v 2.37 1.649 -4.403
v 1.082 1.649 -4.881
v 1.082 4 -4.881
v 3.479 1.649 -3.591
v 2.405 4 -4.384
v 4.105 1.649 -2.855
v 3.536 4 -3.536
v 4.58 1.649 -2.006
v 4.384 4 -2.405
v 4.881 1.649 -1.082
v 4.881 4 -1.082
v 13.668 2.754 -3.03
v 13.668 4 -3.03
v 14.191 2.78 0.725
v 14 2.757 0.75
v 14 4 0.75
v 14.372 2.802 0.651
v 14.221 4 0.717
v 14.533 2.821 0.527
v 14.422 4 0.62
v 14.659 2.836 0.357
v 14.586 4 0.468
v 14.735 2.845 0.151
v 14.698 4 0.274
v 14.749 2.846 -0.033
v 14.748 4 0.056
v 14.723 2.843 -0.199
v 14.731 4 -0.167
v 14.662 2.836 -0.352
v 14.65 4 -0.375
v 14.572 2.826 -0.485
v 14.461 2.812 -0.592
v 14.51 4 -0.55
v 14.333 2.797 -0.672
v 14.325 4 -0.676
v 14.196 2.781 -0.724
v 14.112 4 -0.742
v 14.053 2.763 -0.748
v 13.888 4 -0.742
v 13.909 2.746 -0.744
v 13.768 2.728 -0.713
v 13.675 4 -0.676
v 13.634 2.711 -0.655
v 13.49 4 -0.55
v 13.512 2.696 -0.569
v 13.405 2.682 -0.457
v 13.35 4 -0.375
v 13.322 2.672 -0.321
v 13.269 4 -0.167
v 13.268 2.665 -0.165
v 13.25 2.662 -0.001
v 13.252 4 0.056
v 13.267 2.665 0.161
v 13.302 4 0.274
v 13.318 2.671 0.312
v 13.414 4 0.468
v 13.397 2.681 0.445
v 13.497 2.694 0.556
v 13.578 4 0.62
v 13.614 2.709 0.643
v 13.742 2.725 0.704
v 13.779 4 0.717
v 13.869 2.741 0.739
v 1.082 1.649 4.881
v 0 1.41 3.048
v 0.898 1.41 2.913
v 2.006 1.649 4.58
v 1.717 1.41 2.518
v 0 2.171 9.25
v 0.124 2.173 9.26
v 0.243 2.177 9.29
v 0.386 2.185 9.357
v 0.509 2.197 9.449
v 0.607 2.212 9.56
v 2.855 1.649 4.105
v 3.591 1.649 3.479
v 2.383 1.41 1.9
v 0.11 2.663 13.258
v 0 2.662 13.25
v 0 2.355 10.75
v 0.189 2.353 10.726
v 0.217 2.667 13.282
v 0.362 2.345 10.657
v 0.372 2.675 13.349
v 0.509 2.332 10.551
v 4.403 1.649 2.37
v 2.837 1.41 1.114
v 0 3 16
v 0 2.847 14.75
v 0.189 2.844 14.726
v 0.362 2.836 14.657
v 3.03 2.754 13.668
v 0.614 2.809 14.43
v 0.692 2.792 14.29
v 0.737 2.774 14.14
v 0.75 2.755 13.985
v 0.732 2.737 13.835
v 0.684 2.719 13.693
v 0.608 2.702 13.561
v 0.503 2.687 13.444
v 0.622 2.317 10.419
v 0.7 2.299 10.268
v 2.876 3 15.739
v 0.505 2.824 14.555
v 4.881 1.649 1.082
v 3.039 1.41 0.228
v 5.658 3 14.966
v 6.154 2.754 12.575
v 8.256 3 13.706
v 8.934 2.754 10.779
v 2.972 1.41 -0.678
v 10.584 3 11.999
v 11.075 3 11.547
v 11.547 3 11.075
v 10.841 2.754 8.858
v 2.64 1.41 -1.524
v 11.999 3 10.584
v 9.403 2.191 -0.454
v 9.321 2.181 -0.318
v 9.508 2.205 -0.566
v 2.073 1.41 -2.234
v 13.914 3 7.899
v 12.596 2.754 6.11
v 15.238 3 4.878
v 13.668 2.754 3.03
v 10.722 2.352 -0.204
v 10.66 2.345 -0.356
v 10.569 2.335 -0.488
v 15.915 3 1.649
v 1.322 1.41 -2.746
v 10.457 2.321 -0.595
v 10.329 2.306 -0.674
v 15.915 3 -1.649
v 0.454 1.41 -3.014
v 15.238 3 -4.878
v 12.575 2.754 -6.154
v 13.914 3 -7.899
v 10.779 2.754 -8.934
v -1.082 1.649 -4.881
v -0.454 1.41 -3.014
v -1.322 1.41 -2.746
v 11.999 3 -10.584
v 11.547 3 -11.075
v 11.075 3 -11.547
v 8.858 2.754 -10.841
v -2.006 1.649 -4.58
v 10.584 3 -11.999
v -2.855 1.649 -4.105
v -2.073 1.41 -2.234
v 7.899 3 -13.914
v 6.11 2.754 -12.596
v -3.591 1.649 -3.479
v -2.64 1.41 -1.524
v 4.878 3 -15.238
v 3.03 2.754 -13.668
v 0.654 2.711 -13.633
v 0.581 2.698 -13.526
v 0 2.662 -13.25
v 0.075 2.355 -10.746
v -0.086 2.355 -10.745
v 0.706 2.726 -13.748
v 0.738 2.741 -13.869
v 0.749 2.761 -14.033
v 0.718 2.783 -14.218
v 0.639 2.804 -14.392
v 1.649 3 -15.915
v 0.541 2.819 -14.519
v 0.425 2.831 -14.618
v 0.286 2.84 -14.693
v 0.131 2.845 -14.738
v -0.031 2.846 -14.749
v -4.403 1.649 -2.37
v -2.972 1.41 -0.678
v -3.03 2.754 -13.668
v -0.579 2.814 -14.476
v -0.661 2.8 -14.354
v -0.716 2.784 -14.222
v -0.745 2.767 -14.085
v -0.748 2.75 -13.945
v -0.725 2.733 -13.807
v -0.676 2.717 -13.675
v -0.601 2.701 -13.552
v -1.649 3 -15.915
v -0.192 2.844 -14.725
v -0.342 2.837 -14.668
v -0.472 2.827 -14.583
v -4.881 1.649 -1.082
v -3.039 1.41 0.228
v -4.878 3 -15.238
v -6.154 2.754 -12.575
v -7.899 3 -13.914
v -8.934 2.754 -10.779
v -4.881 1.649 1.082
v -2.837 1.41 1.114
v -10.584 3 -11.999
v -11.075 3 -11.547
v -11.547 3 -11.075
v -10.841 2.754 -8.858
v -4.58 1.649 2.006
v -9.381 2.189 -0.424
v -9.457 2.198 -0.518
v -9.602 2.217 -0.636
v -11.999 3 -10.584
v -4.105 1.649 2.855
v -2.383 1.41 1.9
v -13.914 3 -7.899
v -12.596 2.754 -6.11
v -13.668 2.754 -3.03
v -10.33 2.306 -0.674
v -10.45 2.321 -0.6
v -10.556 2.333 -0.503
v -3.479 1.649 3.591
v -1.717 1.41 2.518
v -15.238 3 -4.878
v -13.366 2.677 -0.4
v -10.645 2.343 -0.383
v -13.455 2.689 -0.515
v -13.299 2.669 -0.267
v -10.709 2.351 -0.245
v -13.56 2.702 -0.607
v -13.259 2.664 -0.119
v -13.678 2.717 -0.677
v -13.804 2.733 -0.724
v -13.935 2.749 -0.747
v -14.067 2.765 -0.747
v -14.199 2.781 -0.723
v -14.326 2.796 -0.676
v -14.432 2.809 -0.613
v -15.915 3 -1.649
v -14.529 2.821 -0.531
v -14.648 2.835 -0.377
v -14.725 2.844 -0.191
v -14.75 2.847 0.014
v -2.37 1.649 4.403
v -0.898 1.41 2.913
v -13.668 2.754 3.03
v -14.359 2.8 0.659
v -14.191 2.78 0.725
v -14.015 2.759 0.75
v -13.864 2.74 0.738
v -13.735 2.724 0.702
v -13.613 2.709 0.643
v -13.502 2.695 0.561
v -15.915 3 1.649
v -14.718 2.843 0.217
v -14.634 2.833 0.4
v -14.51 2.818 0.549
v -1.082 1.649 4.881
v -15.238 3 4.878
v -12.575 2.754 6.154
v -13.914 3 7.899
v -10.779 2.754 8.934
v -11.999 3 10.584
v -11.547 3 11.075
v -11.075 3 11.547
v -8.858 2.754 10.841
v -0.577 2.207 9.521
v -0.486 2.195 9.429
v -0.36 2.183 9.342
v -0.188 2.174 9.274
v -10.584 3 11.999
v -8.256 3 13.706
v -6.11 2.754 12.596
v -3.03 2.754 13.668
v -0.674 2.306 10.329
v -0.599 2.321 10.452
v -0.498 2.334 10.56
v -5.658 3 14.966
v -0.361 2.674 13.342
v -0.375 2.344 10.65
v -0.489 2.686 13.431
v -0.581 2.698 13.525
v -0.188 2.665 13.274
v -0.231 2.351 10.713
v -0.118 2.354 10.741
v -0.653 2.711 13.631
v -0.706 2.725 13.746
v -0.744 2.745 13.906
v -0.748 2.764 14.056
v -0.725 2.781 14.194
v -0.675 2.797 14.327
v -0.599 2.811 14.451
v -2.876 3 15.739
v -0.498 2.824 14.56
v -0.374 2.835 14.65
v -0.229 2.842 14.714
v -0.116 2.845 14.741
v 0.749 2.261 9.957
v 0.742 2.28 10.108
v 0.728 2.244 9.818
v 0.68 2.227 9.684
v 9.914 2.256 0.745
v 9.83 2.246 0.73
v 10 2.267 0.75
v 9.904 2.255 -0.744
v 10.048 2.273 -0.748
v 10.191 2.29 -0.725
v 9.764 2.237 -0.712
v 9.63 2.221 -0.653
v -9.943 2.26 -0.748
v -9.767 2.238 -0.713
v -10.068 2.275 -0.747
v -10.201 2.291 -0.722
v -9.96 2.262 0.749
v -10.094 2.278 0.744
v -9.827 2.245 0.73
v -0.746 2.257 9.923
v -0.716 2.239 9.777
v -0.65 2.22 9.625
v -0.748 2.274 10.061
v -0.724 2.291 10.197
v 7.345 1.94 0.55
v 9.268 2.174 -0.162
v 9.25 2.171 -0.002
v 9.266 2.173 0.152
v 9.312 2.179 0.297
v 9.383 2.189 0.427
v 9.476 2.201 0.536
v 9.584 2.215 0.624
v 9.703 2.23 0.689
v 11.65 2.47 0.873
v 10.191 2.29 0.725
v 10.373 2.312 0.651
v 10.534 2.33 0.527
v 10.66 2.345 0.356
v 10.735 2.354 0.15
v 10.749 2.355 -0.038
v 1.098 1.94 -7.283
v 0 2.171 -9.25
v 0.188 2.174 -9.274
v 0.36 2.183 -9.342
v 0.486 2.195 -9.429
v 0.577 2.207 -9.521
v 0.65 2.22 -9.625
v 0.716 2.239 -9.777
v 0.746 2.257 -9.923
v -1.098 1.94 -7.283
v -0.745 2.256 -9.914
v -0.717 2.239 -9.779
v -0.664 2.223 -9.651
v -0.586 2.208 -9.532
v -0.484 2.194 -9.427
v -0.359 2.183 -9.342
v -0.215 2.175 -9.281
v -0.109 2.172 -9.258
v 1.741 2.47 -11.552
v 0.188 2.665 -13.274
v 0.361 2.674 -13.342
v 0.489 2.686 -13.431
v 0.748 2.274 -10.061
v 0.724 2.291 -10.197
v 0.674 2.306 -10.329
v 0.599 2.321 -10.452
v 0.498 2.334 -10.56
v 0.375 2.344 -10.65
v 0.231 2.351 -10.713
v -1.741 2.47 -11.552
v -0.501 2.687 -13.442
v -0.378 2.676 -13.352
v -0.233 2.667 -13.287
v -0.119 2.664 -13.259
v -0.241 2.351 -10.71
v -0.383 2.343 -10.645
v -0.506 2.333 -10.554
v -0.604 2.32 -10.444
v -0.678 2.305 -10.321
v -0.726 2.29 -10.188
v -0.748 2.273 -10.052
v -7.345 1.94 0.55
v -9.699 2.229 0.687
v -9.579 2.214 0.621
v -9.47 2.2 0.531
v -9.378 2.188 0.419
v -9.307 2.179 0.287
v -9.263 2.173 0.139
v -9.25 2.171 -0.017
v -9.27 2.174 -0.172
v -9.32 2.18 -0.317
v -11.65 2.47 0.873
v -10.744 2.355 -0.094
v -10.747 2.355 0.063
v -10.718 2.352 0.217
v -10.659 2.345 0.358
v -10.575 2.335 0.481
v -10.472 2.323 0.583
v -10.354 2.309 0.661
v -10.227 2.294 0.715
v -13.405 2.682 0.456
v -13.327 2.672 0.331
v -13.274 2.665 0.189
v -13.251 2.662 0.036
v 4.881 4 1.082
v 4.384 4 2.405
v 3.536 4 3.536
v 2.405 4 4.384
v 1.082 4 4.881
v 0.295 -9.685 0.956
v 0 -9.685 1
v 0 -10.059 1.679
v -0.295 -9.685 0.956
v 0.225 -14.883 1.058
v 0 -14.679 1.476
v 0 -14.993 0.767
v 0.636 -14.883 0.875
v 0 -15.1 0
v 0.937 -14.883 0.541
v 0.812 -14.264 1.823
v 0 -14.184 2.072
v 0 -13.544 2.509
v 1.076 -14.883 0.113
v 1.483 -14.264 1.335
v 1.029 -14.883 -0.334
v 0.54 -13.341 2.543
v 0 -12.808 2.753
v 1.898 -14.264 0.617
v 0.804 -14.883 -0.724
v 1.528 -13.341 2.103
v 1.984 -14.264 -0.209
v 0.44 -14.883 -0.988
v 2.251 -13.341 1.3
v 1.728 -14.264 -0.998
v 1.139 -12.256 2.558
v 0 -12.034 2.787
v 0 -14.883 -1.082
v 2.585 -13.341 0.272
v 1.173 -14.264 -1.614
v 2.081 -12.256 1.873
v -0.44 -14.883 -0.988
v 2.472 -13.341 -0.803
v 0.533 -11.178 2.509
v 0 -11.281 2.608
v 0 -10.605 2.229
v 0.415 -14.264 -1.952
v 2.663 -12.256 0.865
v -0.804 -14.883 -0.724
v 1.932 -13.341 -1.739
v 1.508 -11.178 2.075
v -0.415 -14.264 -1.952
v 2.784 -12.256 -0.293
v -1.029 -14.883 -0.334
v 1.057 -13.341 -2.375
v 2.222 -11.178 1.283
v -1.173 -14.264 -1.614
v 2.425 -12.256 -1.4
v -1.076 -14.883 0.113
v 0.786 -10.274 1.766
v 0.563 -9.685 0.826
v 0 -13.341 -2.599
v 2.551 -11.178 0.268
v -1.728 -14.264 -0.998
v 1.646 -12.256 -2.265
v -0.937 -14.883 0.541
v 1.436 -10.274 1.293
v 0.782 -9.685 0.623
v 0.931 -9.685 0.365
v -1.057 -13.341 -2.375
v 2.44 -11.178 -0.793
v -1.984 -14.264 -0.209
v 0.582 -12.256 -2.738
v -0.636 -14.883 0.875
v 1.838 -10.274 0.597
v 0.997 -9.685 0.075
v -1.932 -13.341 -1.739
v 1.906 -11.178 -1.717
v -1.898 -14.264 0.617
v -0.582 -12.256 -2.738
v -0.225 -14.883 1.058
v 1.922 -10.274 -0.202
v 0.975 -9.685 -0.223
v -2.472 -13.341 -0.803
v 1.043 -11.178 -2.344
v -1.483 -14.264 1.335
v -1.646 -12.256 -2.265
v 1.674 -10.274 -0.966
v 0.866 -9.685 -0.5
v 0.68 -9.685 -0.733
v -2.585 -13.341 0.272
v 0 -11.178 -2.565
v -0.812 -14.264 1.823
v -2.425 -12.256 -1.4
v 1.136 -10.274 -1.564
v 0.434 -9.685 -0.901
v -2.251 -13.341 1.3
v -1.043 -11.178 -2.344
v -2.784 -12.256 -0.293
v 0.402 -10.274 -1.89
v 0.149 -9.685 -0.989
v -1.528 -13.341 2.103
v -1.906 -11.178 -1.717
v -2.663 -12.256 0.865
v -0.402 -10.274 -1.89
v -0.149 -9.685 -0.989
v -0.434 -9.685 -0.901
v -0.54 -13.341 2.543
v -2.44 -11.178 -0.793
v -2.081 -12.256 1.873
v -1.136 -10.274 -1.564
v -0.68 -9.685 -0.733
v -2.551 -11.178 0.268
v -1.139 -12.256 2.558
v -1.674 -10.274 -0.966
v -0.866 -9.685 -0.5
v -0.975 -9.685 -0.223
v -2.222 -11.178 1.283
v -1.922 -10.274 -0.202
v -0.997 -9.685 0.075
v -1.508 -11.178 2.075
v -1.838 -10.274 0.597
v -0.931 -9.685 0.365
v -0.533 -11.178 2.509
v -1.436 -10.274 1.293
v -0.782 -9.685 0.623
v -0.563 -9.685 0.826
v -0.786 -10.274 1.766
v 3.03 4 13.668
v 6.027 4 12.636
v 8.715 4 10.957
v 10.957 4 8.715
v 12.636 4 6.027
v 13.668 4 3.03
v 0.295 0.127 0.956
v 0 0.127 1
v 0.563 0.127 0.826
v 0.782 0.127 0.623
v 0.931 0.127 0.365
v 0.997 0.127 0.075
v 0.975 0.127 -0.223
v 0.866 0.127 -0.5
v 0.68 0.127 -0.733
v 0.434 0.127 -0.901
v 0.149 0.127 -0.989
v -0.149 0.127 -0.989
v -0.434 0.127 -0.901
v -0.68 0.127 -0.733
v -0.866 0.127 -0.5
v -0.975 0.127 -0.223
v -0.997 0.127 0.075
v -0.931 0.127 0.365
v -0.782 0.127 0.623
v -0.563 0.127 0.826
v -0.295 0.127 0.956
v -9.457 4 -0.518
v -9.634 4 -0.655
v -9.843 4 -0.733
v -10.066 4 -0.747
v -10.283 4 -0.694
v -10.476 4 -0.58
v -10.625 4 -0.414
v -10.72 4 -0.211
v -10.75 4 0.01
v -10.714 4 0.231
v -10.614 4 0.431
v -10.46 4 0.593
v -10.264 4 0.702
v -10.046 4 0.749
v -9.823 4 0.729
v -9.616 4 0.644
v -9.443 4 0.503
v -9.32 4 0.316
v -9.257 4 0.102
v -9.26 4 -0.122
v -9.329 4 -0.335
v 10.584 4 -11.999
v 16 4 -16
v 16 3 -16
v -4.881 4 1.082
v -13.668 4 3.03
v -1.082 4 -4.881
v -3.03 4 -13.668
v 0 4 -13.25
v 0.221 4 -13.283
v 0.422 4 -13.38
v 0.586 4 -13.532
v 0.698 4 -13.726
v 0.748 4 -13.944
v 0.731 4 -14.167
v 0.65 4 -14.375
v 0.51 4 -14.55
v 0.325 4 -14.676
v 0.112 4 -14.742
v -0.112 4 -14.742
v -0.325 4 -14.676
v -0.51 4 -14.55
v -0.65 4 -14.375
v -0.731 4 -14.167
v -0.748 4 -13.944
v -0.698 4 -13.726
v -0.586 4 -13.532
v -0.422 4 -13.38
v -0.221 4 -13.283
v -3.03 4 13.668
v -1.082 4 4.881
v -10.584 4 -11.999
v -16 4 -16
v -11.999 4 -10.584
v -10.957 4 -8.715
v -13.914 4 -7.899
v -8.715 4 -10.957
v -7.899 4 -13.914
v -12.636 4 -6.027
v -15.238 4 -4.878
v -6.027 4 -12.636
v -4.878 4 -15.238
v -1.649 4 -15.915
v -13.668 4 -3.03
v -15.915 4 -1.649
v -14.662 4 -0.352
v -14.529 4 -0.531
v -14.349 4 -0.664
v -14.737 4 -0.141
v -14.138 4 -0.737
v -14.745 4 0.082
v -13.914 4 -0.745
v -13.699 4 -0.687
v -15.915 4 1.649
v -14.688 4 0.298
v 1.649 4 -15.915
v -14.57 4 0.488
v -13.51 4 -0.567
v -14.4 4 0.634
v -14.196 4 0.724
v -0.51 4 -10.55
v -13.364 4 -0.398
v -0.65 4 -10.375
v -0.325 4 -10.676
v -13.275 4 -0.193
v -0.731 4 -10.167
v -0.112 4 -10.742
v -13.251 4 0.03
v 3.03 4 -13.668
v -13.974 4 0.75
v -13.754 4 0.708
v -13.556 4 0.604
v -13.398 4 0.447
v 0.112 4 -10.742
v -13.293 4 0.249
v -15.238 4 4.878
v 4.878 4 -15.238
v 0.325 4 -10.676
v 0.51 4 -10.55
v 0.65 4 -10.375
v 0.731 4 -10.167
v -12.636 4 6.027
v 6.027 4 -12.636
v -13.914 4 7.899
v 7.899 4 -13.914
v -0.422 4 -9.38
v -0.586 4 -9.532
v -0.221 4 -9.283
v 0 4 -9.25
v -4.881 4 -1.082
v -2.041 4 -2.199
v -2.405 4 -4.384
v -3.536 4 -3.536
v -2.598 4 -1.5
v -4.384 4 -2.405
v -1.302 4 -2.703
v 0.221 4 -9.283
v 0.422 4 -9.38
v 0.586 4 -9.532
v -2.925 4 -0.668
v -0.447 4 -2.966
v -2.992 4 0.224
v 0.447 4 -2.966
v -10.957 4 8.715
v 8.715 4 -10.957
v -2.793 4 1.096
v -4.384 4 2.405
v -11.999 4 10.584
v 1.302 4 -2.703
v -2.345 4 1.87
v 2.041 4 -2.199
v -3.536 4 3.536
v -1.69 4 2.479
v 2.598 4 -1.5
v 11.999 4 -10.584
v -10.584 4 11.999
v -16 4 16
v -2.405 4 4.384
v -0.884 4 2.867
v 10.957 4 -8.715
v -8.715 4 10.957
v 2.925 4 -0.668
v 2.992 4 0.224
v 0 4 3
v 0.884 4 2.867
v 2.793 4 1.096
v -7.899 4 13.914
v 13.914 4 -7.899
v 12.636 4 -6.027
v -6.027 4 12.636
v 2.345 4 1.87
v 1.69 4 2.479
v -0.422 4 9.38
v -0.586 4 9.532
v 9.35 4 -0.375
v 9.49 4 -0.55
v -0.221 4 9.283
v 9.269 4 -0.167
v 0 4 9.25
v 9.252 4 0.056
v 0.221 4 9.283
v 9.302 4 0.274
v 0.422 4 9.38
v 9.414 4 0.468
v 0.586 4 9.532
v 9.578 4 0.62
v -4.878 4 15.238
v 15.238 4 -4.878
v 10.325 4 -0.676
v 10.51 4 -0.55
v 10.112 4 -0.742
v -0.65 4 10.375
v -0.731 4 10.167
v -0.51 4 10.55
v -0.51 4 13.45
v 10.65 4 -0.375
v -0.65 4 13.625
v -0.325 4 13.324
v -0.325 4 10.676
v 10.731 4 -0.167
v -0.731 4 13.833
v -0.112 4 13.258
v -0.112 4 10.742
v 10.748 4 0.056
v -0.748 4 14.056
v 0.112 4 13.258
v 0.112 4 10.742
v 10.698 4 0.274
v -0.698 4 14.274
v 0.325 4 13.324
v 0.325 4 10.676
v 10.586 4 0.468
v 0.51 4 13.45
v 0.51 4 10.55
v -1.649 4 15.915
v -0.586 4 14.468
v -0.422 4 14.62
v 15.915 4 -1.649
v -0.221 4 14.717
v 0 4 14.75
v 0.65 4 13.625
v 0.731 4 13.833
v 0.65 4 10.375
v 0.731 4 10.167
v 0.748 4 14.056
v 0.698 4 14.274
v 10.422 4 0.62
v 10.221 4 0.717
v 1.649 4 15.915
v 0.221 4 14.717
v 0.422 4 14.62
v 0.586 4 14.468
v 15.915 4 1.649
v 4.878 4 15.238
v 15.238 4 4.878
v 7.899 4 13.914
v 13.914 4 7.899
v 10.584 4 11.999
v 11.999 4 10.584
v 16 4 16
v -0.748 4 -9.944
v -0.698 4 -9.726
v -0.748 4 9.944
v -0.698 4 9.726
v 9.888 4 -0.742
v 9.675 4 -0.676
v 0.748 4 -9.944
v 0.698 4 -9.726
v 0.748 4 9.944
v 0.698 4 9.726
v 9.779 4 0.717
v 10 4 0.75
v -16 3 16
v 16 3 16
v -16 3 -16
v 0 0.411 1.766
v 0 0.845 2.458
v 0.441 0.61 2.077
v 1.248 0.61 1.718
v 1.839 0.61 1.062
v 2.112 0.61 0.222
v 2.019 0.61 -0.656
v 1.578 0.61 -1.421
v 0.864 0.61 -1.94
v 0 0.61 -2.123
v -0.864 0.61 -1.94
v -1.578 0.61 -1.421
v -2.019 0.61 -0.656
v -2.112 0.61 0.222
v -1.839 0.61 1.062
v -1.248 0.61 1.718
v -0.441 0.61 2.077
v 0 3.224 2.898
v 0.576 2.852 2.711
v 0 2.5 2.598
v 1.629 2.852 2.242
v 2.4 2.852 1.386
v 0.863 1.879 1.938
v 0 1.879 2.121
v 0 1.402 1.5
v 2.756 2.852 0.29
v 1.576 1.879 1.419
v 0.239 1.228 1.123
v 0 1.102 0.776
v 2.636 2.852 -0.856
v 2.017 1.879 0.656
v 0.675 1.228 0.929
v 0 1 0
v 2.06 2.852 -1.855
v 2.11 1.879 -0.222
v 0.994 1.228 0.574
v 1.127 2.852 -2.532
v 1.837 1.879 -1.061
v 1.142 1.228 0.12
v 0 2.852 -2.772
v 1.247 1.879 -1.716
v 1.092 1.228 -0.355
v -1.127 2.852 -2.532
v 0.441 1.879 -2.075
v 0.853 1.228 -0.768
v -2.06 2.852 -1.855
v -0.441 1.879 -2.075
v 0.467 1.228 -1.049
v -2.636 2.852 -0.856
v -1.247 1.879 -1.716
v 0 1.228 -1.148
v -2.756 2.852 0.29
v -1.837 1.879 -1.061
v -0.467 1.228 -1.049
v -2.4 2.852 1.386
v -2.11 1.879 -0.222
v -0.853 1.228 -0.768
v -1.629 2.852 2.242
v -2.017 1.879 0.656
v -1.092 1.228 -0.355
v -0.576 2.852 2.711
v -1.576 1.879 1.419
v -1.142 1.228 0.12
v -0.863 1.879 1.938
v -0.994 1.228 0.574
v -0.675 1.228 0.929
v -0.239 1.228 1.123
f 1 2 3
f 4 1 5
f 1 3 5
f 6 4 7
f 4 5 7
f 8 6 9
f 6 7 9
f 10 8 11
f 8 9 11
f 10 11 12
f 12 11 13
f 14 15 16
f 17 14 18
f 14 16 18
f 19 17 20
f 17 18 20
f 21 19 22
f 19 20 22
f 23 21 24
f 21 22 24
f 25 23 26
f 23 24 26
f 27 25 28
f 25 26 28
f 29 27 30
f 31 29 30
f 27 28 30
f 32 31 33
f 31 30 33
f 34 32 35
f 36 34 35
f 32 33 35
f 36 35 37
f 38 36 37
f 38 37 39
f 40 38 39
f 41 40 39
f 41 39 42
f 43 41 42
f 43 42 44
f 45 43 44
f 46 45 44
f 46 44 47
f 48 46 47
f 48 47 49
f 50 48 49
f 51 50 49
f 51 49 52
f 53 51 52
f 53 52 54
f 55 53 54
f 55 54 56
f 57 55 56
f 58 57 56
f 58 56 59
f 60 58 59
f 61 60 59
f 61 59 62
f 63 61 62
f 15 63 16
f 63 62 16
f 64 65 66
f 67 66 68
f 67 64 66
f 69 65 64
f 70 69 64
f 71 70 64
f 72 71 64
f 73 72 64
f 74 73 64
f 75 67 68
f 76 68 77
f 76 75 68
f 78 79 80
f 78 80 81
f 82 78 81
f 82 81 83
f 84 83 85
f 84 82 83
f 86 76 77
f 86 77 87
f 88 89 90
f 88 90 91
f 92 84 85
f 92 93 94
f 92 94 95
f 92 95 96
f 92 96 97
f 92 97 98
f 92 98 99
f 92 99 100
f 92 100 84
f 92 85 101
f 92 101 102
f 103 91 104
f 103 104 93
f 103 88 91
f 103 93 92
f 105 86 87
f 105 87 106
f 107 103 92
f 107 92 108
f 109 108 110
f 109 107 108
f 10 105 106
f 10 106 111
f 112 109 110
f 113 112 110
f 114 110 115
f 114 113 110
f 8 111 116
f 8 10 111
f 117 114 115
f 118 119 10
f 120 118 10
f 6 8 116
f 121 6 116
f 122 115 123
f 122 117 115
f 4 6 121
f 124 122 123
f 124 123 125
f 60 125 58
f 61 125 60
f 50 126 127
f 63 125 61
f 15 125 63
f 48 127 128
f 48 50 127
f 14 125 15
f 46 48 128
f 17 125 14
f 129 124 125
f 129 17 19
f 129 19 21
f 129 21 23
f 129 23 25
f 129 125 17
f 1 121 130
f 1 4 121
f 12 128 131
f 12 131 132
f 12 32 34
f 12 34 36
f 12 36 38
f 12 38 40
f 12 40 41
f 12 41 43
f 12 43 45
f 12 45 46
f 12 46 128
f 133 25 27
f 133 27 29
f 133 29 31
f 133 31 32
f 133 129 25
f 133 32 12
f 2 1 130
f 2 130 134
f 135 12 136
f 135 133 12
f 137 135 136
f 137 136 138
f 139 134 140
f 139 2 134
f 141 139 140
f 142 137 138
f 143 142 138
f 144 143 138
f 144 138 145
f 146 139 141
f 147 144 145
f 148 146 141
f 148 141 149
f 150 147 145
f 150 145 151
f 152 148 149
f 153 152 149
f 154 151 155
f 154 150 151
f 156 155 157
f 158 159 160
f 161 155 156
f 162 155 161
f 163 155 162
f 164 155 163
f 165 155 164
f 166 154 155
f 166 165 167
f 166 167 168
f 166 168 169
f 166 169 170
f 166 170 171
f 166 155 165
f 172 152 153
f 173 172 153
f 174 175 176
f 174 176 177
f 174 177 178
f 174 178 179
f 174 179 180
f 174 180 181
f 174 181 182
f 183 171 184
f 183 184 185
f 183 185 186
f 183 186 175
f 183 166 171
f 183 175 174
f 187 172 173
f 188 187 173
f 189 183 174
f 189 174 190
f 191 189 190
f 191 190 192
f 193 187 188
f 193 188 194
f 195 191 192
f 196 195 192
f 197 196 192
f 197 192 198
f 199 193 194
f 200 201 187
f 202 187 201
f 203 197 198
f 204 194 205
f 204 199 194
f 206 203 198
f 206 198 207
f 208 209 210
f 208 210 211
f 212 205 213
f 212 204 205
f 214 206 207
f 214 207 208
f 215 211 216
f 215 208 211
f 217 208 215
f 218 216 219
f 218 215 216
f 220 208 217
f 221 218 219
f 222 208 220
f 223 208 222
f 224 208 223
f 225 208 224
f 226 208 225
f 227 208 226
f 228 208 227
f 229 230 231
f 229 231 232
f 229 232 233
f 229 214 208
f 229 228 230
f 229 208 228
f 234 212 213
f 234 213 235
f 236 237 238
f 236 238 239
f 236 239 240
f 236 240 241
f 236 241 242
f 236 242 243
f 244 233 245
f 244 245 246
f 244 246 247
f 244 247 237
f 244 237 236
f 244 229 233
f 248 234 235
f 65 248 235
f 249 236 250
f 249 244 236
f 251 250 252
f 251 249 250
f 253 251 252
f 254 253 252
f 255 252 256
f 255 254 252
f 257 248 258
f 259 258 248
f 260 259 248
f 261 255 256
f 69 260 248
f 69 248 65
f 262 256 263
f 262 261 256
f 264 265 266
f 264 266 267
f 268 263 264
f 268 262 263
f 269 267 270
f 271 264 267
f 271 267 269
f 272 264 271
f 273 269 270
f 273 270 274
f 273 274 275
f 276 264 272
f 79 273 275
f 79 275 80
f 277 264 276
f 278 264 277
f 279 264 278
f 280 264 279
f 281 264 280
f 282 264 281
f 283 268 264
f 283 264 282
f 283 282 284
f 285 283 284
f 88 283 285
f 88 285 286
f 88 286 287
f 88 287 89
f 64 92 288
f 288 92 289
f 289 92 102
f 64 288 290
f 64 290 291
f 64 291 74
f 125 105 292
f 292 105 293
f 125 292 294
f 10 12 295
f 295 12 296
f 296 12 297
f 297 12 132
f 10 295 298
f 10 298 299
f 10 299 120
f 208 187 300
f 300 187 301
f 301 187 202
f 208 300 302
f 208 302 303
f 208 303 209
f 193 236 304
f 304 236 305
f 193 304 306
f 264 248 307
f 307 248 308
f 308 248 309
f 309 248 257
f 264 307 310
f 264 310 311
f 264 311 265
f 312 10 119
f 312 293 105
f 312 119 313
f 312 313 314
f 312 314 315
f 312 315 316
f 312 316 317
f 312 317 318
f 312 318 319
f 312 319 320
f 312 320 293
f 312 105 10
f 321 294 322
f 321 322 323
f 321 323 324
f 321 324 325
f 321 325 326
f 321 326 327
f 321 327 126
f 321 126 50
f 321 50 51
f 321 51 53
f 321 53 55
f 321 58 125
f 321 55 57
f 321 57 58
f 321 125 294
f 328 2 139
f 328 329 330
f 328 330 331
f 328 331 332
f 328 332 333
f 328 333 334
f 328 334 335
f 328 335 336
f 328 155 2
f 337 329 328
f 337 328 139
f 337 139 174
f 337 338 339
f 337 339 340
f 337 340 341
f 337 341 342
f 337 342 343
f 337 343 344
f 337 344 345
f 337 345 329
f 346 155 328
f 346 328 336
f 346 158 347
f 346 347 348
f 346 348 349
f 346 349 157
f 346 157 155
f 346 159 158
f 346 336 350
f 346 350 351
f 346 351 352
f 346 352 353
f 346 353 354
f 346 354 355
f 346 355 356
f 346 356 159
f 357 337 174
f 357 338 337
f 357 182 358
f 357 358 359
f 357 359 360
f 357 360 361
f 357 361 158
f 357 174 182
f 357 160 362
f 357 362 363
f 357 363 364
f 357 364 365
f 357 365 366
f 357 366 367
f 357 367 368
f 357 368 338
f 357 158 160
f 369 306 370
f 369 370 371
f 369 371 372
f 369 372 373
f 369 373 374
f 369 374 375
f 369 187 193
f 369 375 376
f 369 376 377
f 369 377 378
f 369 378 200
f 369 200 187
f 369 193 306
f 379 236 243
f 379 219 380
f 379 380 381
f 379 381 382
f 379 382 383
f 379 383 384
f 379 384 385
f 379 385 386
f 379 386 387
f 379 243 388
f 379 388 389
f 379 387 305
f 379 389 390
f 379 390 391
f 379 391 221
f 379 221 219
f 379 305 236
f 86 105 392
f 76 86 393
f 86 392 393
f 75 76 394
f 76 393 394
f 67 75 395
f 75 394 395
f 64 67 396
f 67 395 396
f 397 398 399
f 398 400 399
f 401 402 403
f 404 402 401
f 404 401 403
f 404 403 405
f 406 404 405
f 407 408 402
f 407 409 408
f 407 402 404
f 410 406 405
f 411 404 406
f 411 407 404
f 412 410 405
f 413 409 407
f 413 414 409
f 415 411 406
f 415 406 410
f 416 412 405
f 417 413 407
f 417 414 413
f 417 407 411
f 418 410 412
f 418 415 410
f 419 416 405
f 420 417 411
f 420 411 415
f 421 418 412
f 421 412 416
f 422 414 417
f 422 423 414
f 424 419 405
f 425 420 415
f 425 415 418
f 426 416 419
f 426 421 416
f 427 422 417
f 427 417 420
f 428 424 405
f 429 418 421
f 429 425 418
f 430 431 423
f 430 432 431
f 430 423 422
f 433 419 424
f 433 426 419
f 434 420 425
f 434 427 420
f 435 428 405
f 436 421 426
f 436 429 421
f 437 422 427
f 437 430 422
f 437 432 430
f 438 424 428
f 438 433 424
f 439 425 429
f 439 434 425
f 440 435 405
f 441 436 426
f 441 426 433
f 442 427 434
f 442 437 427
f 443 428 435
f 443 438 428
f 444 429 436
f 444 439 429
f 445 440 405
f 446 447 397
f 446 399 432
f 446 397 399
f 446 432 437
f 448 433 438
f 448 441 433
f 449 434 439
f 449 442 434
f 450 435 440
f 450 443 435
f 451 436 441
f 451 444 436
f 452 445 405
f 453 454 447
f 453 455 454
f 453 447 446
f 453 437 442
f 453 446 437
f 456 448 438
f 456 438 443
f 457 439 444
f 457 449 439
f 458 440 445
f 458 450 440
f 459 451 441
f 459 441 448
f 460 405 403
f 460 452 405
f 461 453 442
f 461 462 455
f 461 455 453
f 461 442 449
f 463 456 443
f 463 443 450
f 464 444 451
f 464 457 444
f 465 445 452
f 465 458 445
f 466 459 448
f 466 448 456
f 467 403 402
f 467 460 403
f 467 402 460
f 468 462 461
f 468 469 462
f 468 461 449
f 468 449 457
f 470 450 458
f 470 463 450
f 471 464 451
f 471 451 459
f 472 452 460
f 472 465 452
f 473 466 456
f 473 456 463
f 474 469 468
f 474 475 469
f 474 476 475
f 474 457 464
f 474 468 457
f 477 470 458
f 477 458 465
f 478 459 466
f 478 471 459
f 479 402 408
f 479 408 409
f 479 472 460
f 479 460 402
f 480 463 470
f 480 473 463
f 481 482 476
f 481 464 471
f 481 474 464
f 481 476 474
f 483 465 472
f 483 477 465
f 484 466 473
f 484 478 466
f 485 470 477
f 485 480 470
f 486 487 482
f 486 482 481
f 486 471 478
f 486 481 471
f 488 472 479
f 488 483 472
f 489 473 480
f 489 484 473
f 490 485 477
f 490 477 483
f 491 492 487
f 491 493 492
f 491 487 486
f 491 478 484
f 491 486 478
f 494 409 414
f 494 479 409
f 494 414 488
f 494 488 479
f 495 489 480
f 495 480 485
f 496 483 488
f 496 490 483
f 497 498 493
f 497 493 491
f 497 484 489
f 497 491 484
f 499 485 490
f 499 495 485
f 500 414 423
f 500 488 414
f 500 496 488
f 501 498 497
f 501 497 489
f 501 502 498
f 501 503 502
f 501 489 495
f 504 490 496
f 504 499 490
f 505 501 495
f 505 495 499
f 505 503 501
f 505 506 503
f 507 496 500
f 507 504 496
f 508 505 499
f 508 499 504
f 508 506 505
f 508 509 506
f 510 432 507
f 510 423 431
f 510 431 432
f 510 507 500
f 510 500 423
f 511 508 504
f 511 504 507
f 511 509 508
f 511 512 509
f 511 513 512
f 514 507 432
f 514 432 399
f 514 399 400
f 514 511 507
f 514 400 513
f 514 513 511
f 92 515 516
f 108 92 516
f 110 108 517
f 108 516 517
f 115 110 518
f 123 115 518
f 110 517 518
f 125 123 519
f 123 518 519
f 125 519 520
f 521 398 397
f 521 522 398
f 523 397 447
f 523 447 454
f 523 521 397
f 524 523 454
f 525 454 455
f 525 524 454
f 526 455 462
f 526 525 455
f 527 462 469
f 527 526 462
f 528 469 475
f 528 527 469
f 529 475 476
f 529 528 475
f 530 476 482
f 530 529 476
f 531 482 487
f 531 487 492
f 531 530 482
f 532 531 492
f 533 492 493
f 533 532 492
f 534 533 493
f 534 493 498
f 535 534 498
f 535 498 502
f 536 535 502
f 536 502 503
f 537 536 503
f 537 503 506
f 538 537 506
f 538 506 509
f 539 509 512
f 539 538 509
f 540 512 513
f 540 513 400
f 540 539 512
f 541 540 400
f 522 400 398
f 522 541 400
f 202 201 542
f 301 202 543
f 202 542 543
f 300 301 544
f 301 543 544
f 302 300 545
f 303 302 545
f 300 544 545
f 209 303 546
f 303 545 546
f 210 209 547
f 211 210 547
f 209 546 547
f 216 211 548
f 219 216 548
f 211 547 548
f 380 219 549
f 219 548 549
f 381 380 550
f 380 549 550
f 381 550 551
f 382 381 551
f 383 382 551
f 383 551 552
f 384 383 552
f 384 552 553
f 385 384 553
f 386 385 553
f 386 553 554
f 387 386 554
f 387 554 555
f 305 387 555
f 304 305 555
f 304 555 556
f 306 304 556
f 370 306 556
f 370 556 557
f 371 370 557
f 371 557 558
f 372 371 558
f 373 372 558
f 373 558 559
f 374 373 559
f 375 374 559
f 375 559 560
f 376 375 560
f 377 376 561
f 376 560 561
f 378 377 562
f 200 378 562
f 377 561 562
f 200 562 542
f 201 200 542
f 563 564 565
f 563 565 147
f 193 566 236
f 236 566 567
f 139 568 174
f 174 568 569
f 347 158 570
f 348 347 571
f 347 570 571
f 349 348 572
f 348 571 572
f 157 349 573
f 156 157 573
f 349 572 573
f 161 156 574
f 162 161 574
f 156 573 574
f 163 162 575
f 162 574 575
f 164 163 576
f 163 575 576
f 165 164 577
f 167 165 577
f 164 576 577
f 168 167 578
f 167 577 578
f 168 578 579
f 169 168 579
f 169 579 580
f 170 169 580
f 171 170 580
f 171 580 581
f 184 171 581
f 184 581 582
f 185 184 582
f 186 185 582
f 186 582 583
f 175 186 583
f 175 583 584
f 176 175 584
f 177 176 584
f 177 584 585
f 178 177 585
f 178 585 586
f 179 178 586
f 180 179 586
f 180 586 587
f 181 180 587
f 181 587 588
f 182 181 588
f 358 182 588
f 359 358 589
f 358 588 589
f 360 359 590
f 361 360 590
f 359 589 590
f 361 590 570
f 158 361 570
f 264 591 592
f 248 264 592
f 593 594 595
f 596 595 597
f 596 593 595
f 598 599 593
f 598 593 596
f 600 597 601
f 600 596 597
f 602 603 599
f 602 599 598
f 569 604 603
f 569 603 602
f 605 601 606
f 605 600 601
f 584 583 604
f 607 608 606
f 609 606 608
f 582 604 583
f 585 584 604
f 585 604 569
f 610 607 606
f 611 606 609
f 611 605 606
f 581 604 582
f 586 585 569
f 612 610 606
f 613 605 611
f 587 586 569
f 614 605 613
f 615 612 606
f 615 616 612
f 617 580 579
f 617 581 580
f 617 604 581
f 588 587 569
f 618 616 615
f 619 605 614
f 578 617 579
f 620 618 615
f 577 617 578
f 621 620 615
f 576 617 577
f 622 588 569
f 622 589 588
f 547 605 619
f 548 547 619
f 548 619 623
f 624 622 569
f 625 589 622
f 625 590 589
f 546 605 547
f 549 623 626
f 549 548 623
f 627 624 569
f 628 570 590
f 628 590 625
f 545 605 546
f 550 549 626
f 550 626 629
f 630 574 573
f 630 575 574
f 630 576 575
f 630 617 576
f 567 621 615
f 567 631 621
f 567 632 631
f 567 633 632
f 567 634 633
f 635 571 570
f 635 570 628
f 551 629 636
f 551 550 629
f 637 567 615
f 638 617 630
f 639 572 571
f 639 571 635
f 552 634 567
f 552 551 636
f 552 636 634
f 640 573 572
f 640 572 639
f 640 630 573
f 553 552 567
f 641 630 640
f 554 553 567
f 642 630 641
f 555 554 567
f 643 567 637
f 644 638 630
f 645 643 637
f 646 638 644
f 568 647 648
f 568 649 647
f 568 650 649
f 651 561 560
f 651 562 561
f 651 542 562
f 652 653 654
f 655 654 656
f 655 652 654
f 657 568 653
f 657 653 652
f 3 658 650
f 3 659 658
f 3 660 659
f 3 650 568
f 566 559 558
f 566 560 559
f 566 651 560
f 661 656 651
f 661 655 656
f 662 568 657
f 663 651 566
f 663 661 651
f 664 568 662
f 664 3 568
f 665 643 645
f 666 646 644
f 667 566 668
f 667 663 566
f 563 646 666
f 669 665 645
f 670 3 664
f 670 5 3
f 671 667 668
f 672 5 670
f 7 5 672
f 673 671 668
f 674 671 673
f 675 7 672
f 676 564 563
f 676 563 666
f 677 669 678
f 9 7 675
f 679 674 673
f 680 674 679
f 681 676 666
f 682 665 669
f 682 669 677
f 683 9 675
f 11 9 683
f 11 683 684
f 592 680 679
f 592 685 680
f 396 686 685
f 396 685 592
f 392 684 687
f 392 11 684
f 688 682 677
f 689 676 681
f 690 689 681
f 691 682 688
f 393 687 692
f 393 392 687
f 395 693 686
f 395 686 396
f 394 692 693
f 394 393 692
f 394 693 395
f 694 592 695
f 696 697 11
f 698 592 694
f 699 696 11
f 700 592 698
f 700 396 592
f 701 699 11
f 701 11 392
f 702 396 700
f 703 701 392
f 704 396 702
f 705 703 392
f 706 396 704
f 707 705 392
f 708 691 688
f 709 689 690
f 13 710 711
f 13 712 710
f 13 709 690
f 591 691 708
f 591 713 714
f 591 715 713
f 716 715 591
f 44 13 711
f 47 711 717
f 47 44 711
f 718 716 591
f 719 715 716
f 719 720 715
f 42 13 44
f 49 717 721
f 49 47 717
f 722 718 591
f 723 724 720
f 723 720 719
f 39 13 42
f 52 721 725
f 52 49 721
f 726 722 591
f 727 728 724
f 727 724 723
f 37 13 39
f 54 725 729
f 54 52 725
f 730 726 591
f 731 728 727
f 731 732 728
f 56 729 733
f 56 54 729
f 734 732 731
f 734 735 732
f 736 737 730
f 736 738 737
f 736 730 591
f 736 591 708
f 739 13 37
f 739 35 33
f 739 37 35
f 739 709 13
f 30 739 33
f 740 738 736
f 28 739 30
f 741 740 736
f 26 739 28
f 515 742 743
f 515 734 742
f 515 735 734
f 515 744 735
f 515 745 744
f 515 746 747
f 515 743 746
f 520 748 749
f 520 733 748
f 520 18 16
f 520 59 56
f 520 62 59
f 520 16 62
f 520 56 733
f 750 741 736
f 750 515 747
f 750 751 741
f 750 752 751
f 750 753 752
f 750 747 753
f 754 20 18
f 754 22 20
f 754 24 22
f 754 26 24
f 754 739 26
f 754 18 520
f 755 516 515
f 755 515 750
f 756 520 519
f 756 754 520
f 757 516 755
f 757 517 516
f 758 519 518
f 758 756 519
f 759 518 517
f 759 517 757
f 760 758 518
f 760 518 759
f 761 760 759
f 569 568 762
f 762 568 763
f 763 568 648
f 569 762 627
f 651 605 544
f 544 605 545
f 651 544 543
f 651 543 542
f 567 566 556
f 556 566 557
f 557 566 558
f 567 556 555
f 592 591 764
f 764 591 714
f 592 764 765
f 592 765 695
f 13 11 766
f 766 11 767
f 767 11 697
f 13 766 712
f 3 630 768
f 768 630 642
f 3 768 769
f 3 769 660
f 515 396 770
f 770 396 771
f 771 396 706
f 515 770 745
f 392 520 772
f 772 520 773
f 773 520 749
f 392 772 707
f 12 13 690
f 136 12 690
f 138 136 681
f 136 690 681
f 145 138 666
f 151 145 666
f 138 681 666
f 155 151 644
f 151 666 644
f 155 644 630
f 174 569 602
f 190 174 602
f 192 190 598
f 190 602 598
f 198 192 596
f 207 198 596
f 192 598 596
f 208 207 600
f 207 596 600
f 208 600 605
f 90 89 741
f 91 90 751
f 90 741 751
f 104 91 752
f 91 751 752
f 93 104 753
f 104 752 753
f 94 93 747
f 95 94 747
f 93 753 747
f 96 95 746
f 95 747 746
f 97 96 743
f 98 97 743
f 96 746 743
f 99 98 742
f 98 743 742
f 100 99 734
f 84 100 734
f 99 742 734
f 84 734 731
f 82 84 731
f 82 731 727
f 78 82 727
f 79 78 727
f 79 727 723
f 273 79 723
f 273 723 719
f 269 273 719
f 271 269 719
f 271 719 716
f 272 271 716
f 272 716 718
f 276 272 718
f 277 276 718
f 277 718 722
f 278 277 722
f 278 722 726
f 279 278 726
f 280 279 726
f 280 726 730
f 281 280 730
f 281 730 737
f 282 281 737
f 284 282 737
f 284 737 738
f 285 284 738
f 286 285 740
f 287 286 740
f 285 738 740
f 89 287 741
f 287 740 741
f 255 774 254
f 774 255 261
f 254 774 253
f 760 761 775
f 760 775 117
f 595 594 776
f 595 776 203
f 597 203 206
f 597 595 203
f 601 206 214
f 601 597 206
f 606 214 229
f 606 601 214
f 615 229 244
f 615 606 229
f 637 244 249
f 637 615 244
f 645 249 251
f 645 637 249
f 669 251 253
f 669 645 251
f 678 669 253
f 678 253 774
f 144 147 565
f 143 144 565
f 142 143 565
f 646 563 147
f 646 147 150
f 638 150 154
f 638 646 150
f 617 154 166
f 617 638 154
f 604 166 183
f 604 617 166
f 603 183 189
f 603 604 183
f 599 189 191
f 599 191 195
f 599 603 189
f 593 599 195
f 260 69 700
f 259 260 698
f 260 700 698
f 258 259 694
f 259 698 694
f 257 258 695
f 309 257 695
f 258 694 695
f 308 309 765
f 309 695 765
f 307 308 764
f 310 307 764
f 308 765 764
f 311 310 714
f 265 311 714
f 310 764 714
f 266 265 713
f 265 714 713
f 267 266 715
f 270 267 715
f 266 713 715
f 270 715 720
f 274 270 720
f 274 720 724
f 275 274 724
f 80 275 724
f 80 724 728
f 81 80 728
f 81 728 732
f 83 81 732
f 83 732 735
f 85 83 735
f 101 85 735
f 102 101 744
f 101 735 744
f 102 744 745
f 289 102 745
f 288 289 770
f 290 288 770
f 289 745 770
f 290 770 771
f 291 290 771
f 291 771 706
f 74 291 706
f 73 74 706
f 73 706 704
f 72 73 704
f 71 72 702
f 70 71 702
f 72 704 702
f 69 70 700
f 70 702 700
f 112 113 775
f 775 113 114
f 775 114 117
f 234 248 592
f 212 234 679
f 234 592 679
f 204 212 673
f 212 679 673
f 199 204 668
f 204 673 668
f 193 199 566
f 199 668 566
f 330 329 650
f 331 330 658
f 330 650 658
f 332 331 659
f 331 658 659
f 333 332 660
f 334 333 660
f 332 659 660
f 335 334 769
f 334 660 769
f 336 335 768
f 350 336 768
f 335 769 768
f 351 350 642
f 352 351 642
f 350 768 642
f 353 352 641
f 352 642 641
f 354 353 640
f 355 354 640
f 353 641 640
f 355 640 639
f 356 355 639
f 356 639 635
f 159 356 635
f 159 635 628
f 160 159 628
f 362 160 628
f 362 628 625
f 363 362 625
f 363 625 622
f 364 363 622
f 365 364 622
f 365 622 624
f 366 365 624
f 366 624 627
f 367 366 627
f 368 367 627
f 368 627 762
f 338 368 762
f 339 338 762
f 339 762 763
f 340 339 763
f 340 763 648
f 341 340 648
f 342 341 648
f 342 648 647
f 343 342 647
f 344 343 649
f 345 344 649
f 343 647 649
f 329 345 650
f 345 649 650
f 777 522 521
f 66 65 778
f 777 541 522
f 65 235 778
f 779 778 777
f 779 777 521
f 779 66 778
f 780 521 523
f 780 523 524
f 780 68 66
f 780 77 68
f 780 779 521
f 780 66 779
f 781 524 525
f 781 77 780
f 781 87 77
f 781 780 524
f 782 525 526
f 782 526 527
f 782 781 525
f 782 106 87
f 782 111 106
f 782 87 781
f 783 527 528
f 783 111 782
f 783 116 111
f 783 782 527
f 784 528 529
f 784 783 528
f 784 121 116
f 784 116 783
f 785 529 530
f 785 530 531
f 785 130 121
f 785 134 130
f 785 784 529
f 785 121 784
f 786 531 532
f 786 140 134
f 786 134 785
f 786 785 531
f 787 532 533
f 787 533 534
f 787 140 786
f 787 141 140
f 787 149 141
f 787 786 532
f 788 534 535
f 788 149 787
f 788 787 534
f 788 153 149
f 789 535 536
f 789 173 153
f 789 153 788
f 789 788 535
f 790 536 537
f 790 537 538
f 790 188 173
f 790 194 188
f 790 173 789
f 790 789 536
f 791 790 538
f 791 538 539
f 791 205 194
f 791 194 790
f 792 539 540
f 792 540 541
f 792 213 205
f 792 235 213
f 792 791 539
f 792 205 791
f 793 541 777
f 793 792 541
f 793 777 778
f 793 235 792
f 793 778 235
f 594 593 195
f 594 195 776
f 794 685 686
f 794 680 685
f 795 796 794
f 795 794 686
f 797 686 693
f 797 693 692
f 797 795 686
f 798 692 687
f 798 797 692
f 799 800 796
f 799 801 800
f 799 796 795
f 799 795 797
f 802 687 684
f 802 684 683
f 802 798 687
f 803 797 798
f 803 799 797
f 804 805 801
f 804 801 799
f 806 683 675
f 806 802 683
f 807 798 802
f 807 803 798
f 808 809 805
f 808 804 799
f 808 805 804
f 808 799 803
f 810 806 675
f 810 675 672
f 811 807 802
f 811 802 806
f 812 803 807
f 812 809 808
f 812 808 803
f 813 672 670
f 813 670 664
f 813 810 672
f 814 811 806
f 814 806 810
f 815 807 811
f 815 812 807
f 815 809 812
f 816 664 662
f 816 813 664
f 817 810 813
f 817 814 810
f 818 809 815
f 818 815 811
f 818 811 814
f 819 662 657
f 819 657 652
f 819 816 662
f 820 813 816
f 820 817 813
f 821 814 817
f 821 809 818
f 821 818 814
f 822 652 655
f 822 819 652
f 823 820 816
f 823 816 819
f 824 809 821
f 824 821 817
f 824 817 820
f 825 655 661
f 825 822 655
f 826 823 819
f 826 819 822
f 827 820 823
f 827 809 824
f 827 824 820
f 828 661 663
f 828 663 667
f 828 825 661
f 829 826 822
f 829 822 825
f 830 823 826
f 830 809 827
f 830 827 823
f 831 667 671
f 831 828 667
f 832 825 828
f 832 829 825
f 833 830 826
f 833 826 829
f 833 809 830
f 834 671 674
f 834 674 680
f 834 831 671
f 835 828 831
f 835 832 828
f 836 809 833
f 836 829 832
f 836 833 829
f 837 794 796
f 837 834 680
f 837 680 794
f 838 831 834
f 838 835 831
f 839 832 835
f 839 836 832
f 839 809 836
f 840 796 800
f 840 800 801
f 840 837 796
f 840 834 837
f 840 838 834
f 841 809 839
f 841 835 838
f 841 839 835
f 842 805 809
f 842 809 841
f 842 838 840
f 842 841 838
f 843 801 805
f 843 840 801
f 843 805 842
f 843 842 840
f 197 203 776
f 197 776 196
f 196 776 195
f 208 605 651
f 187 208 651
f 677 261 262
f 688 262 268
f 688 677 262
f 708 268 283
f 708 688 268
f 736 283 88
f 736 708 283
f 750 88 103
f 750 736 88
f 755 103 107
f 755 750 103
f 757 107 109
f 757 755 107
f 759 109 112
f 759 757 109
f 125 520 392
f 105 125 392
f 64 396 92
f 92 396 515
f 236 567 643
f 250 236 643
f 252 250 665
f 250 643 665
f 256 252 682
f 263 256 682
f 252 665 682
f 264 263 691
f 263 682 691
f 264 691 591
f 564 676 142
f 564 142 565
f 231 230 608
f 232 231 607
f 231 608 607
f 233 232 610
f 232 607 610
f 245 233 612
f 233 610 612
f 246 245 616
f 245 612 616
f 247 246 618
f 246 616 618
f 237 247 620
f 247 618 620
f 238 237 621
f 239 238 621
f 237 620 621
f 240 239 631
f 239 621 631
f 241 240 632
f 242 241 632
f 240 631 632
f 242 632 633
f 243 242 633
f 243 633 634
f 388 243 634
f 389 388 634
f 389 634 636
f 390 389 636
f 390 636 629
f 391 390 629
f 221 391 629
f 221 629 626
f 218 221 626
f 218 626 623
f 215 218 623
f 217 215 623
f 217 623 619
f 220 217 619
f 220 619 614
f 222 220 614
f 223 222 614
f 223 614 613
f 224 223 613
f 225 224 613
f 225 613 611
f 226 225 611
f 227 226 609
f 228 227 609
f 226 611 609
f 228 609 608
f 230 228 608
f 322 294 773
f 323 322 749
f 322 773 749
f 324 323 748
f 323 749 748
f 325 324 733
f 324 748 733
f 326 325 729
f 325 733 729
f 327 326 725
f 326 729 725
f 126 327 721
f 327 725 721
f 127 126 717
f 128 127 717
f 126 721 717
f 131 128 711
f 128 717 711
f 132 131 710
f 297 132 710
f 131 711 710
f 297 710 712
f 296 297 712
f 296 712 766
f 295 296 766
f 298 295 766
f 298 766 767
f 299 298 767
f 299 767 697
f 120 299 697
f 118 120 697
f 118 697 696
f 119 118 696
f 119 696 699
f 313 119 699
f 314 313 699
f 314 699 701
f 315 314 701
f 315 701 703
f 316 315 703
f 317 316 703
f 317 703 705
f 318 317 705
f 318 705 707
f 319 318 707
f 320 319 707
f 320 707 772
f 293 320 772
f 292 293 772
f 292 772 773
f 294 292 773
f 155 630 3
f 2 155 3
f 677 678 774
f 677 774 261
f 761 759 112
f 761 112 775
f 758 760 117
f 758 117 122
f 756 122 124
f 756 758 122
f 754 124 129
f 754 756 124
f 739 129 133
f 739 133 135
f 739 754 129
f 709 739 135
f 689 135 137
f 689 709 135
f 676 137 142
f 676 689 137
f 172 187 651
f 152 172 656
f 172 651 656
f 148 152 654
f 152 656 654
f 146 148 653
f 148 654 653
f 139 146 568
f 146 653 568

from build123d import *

# Parameters (mm, degrees)
SKETCH4_R           = 0.75
CUT_EXTRUDE2_DEPTH  = 4
BOSS_EXTRUDE2_DEPTH = 1


with BuildPart() as part:
    # Sketch1 → Revolve1 (revolve)
    with BuildSketch(Plane(origin=(0, 0, 0), x_dir=(0, 0, -1), z_dir=(1, 0, 0))):
        with BuildLine():
            ThreePointArc((-3, 4), (-2.121320344, 1.878679656), (0, 1))
            Line((0, 1), (0, 0))
            Line((0, 0), (0, -9.5))
            Line((0, -9.5), (0, -15.1))
            ThreePointArc((0, -15.1), (-2.753447859, -12.808453427), (-1, -9.684660634))
            Line((-1, -9.684660634), (-1, 0.127016654))
            ThreePointArc((-1, 0.127016654), (-2.123180734, 0.609999474), (-3.048002331, 1.409694653))
            Line((-3.048002331, 1.409694653), (-16, 3))
            Line((-16, 3), (-16, 4))
            Line((-16, 4), (-4, 4))
            Line((-4, 4), (-3, 4))
        make_face()
    revolve(axis=Axis((0, 10.634252877, 0), (0, 1, 0)))

    # Sketch4 → Cut-Extrude2 (cut)
    with BuildSketch(Plane(origin=(0, 4, 0), x_dir=(1, 0, 0), z_dir=(0, 1, 0))):
        with BuildLine():
            Line((-1.08219807, 4.881480036), (-3.030154595, 13.6681441))
            ThreePointArc((-3.030154595, 13.6681441), (-9.899494937, 9.899494937), (-13.6681441, 3.030154595))
            Line((-13.6681441, 3.030154595), (-4.881480036, 1.08219807))
            ThreePointArc((-4.881480036, 1.08219807), (-3.535533906, 3.535533906), (-1.08219807, 4.881480036))
        make_face()
        with BuildLine():
            Line((-4.881480036, -1.08219807), (-13.6681441, -3.030154595))
            ThreePointArc((-13.6681441, -3.030154595), (-9.899494937, -9.899494937), (-3.030154595, -13.6681441))
            Line((-3.030154595, -13.6681441), (-1.08219807, -4.881480036))
            ThreePointArc((-1.08219807, -4.881480036), (-3.535533906, -3.535533906), (-4.881480036, -1.08219807))
        make_face()
        with BuildLine():
            ThreePointArc((3.030154595, -13.6681441), (9.899494937, -9.899494937), (13.6681441, -3.030154595))
            Line((13.6681441, -3.030154595), (4.881480036, -1.08219807))
            ThreePointArc((4.881480036, -1.08219807), (3.535533906, -3.535533906), (1.08219807, -4.881480036))
            Line((1.08219807, -4.881480036), (3.030154595, -13.6681441))
        make_face()
        with BuildLine():
            ThreePointArc((13.6681441, 3.030154595), (9.899494937, 9.899494937), (3.030154595, 13.6681441))
            Line((3.030154595, 13.6681441), (1.08219807, 4.881480036))
            ThreePointArc((1.08219807, 4.881480036), (3.535533906, 3.535533906), (4.881480036, 1.08219807))
            Line((4.881480036, 1.08219807), (13.6681441, 3.030154595))
        make_face()
        with Locations(Location((-14, 0, 0), (0, 0, 134.876670286))):
            Circle(SKETCH4_R)
        with Locations(Location((-10, 0, 0), (0, 0, 43.63623207))):
            Circle(SKETCH4_R)
        with Locations(Location((0, 10, 0), (0, 0, 270))):
            Circle(SKETCH4_R)
        with Locations(Location((0, 14, 0), (0, 0, 270))):
            Circle(SKETCH4_R)
        with Locations(Location((0, -10, 0), (0, 0, 90))):
            Circle(SKETCH4_R)
        with Locations(Location((0, -14, 0), (0, 0, 270.000000015))):
            Circle(SKETCH4_R)
        with Locations(Location((10, 0, 0), (0, 0, 270))):
            Circle(SKETCH4_R)
        with Locations(Location((14, 0, 0), (0, 0, 270))):
            Circle(SKETCH4_R)
    extrude(amount=-CUT_EXTRUDE2_DEPTH, mode=Mode.SUBTRACT)

    # Sketch5 → Boss-Extrude2 (add)
    with BuildSketch(Plane(origin=(0, 4, 0), x_dir=(1, 0, 0), z_dir=(0, 1, 0))):
        with BuildLine():
            ThreePointArc((-11.998696572, 10.584483009), (-11.313708499, 11.313708499), (-10.584483009, 11.998696572))
            Line((-10.584483009, 11.998696572), (-16, 16))
            Line((-16, 16), (-11.998696572, 10.584483009))
        make_face()
        with BuildLine():
            Line((16, 16), (10.584483009, 11.998696572))
            ThreePointArc((10.584483009, 11.998696572), (11.313708499, 11.313708499), (11.998696572, 10.584483009))
            Line((11.998696572, 10.584483009), (16, 16))
        make_face()
        with BuildLine():
            ThreePointArc((11.998696572, -10.584483009), (11.313708499, -11.313708499), (10.584483009, -11.998696572))
            Line((10.584483009, -11.998696572), (16, -16))
            Line((16, -16), (11.998696572, -10.584483009))
        make_face()
        with BuildLine():
            ThreePointArc((-10.584483009, -11.998696572), (-11.313708499, -11.313708499), (-11.998696572, -10.584483009))
            Line((-11.998696572, -10.584483009), (-16, -16))
            Line((-16, -16), (-10.584483009, -11.998696572))
        make_face()
    extrude(amount=-BOSS_EXTRUDE2_DEPTH)


solid = part.part
